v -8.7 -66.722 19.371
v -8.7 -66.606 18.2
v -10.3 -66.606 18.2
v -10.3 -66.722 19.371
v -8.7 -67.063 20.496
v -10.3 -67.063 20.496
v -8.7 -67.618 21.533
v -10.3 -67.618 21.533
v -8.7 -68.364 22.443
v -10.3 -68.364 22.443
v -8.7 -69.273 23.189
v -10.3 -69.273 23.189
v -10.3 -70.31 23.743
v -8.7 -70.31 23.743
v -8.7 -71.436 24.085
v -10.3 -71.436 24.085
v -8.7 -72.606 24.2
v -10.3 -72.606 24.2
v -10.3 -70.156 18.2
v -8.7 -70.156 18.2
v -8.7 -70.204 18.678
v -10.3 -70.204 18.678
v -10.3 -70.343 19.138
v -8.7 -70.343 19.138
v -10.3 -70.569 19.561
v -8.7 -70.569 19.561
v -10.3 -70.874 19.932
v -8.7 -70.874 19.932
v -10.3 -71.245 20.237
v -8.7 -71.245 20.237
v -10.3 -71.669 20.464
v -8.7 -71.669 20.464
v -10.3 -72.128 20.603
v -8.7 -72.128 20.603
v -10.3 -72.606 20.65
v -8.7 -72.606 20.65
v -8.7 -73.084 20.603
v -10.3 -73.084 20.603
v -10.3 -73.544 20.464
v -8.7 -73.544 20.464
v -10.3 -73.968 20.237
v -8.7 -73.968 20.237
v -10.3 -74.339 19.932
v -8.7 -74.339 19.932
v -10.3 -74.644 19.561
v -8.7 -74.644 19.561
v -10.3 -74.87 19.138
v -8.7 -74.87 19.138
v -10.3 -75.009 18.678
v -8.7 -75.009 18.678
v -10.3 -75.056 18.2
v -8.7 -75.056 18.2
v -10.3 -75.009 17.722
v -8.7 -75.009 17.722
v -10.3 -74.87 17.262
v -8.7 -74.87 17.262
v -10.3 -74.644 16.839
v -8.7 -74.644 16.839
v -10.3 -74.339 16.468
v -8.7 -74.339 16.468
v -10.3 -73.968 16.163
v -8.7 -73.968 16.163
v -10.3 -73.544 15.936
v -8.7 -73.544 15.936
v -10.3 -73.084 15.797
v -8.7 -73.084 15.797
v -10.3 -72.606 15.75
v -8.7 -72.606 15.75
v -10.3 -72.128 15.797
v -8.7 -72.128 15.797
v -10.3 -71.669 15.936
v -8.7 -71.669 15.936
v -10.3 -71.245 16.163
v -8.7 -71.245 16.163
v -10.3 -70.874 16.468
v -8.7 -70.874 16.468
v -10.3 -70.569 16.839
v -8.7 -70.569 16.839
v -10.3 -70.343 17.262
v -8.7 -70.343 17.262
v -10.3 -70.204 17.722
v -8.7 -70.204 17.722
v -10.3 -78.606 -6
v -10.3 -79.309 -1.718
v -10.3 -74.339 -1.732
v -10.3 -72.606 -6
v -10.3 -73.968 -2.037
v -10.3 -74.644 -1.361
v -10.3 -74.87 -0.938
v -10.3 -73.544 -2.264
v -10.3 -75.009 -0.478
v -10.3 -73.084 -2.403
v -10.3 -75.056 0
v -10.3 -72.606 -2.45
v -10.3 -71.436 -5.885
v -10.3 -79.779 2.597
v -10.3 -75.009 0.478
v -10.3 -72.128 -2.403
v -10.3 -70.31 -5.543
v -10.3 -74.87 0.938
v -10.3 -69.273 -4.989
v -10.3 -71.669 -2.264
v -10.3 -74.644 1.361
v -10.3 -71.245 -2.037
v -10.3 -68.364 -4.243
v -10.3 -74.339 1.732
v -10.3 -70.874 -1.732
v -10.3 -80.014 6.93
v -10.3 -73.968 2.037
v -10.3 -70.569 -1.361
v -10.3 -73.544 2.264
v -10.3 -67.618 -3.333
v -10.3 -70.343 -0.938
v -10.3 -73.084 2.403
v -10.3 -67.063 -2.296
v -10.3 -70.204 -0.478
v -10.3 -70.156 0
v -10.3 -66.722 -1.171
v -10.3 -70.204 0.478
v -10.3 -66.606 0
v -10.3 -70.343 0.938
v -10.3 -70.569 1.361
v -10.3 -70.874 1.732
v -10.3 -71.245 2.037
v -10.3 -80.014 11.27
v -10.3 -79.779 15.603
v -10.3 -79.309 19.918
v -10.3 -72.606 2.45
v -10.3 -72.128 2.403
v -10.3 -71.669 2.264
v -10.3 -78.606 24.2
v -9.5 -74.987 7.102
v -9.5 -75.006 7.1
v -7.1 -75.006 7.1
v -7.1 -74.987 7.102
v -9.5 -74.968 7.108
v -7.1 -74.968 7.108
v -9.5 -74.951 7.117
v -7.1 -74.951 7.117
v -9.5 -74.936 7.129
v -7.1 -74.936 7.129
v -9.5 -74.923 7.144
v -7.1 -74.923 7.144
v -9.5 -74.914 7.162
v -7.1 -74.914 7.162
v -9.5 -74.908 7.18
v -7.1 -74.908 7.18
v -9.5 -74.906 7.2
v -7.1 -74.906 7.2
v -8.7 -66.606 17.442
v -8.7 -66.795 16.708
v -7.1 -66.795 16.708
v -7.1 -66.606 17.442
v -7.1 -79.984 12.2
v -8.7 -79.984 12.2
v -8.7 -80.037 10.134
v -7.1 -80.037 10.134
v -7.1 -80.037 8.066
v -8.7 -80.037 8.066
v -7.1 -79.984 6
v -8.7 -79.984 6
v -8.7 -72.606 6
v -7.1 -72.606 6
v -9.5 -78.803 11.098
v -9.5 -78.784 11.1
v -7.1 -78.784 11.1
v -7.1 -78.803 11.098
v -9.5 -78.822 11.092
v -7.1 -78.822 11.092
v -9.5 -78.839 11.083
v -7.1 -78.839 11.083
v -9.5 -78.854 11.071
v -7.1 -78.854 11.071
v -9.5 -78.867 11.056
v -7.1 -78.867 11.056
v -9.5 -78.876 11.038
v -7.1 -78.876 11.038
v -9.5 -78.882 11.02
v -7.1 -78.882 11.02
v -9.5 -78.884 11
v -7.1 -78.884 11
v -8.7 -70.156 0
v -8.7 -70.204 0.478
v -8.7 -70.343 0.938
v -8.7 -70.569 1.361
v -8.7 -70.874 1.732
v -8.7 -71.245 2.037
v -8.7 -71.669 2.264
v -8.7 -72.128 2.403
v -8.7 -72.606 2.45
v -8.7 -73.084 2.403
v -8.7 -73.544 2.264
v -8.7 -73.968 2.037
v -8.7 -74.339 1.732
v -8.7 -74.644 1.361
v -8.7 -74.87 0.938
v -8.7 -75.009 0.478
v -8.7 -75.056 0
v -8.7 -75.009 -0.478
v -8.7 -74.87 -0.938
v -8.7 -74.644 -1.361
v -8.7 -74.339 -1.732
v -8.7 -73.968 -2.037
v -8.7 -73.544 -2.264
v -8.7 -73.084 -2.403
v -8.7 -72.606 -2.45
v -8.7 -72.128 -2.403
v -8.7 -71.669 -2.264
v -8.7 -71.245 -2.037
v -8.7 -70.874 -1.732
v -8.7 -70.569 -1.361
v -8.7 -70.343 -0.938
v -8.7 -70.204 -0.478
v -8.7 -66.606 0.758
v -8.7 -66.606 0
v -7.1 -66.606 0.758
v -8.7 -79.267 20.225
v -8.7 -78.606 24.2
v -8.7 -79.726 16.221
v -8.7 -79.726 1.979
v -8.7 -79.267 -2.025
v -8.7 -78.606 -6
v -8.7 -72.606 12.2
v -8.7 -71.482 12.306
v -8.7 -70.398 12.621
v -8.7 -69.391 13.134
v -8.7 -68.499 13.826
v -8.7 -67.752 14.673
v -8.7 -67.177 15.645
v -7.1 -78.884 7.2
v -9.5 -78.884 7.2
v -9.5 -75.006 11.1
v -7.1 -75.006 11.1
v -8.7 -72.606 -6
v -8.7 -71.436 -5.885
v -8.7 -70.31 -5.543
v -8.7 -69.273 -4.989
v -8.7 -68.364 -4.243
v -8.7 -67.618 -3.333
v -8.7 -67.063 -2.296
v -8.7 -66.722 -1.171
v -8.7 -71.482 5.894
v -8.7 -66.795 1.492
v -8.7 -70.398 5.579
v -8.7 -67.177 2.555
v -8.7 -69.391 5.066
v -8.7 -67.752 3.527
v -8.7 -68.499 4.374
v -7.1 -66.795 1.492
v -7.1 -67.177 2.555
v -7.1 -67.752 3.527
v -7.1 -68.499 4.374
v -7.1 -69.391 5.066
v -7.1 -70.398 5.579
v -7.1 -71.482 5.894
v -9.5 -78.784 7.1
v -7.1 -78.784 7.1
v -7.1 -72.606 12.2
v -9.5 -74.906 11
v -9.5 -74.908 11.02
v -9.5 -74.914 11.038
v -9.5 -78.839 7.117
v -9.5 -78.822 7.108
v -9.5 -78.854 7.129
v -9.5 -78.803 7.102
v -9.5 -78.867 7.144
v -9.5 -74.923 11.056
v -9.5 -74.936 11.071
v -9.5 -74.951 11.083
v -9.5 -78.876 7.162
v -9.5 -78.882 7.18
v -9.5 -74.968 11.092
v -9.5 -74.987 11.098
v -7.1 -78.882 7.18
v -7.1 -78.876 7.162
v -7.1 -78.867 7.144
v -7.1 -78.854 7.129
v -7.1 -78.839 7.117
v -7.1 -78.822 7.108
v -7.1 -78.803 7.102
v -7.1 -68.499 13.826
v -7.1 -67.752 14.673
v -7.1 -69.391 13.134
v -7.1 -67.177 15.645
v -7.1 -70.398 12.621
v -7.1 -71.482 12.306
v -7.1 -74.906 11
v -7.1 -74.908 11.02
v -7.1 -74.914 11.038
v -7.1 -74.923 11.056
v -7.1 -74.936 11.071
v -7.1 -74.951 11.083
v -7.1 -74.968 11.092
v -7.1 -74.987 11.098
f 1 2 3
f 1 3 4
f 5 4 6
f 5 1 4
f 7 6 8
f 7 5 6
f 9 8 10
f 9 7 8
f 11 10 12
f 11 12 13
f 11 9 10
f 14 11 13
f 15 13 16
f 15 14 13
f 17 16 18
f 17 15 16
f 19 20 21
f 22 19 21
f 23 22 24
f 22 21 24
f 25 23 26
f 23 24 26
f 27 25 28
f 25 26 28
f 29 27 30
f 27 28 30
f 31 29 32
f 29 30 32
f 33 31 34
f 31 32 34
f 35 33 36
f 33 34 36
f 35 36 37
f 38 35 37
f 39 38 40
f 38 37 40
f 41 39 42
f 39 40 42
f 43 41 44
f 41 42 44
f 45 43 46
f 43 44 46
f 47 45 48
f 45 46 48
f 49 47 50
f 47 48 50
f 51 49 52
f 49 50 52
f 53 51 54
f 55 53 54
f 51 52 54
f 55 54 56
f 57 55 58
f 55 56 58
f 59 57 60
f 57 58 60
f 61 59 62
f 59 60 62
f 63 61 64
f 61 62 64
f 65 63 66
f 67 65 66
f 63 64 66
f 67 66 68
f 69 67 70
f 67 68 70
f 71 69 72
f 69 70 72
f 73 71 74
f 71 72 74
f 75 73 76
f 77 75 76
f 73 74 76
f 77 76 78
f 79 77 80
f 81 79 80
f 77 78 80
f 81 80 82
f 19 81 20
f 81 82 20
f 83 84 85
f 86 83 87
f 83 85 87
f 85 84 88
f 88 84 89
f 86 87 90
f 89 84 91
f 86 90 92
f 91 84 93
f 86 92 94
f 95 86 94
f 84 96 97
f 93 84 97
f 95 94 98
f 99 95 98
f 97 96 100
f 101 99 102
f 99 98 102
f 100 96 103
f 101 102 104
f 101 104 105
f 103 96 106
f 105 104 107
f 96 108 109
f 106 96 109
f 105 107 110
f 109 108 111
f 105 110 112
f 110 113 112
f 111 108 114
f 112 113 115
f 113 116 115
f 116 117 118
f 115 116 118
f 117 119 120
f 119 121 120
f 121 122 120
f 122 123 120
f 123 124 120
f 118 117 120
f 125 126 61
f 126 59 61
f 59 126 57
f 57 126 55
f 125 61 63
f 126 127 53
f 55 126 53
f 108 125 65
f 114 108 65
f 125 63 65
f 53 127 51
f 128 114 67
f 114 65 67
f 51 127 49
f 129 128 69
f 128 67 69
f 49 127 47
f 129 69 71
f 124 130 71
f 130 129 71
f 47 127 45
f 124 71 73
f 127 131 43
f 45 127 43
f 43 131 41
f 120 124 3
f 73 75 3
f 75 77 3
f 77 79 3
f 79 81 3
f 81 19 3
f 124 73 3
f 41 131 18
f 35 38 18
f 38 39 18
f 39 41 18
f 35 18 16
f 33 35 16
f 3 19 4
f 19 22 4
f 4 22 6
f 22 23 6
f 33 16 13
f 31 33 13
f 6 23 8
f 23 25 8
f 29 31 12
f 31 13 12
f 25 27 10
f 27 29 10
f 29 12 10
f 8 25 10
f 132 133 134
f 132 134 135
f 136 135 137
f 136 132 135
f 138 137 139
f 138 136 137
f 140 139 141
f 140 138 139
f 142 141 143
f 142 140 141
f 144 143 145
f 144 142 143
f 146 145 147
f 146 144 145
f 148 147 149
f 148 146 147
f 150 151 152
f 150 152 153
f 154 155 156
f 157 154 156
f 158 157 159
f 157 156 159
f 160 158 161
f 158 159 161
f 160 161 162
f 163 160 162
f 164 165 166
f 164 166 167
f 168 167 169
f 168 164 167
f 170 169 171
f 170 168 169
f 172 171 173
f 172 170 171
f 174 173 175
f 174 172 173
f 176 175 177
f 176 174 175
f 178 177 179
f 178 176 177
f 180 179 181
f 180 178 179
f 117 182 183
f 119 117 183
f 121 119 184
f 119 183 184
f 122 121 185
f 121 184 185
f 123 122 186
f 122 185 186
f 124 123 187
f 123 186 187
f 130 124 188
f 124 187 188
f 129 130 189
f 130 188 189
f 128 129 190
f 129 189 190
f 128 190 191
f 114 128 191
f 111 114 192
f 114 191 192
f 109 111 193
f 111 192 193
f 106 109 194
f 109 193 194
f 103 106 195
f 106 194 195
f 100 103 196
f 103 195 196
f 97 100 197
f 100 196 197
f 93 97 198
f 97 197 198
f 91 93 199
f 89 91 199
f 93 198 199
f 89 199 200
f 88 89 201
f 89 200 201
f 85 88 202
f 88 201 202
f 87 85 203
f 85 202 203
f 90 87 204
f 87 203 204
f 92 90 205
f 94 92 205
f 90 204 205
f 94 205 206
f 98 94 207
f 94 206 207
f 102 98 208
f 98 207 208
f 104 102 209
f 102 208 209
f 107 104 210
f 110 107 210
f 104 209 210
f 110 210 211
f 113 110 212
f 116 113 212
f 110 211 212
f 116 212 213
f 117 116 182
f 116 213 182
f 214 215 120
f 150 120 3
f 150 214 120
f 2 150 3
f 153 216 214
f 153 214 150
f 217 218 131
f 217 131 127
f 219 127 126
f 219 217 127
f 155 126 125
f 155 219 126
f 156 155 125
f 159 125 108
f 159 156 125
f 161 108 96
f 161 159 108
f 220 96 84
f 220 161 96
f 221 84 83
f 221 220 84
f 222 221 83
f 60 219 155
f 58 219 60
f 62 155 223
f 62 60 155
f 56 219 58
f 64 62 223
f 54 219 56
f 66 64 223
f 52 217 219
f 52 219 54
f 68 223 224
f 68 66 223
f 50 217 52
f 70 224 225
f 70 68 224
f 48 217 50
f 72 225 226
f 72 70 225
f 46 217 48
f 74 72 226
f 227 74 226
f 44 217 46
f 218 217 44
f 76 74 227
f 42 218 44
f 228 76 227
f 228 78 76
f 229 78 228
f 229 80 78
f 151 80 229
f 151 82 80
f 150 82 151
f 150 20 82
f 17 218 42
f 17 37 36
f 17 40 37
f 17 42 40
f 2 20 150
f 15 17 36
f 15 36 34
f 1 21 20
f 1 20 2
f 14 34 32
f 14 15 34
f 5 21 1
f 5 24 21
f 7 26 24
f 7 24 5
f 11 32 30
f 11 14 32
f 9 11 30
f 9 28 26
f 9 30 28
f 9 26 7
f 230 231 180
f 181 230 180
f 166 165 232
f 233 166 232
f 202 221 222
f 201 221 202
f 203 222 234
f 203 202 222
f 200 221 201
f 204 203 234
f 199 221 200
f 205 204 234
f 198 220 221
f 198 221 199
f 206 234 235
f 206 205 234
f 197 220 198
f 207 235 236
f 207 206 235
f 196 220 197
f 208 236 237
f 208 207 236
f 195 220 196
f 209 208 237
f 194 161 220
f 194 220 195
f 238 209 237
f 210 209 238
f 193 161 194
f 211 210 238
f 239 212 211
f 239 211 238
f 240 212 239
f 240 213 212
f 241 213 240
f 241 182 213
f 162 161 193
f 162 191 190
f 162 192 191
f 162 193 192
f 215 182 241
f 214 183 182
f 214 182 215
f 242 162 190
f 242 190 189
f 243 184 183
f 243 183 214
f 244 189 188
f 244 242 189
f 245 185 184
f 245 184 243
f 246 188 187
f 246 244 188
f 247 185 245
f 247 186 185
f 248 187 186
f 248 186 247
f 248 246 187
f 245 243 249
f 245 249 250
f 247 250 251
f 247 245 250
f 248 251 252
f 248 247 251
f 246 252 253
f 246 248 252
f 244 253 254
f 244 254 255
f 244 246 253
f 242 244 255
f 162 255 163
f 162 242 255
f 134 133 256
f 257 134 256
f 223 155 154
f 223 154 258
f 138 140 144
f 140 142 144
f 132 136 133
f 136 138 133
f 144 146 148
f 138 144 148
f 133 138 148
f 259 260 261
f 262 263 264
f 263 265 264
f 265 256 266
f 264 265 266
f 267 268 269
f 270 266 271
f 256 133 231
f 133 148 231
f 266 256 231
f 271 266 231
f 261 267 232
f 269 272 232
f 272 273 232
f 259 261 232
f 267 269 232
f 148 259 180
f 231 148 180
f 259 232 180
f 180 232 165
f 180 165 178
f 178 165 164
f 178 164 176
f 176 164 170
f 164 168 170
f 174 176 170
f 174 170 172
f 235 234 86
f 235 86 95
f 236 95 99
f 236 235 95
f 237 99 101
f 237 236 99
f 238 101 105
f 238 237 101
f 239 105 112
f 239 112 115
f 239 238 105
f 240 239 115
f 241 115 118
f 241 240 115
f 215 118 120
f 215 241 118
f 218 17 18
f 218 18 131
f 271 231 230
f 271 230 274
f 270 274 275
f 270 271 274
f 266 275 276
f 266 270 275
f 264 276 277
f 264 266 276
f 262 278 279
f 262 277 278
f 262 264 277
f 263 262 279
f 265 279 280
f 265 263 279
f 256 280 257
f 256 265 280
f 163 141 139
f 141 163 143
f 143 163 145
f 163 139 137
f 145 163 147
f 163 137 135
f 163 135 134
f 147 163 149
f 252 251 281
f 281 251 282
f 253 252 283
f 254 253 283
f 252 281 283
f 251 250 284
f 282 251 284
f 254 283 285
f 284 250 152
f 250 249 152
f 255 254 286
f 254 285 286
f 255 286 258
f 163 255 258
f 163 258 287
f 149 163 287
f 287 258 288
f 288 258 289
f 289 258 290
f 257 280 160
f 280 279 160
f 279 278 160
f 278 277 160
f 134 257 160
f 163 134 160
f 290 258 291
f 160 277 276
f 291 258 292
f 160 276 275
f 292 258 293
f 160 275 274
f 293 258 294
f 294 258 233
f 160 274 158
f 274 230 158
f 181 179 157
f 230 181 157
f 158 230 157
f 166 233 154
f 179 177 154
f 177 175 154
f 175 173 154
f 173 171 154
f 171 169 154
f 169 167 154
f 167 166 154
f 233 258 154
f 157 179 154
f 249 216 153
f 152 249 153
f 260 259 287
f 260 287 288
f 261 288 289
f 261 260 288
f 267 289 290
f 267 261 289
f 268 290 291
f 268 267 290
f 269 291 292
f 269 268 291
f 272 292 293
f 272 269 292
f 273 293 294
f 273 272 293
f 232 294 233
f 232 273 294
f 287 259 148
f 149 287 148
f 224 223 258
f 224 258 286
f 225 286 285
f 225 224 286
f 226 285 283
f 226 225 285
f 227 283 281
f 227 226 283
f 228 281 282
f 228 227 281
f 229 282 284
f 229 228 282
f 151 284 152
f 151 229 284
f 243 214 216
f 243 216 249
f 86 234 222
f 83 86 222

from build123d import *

# Parameters (mm, degrees)
SKETCH004_R  = 2.45
PAD003_DEPTH = 1.6
PAD004_DEPTH = 1.6
POCKET_DEPTH = 2.401


with BuildPart() as part:
    # Sketch004 → Pad003 (new body)
    with BuildSketch(Plane.YZ.offset(-8.7)):
        with BuildLine():
            ThreePointArc((6, 18.2), (4.2426406871, 22.4426406871), (0, 24.2))
            Line((0, 24.2), (-6, 24.2))
            ThreePointArc((-6, 24.2), (-7.4371881489, 9.1), (-6, -6))
            Line((0, -6), (-6, -6))
            ThreePointArc((0, -6), (4.2426406871, -4.2426406871), (6, 0))
            Line((6, 0), (6, 18.2))
        make_face()
        with Locations((0, 18.2)):
            Circle(SKETCH004_R, mode=Mode.SUBTRACT)
        Circle(SKETCH004_R, mode=Mode.SUBTRACT)
    extrude(amount=-PAD003_DEPTH)

    # Sketch005 → Pad004 (join)
    with BuildSketch(Plane.YZ.offset(-8.7)):
        with BuildLine():
            ThreePointArc((0, 12.2), (3.6774423219, 13.4590699257), (5.8114989668, 16.707860677))
            Line((5.8114989668, 16.707860677), (6, 17.4420237293))
            Line((6, 17.4420237293), (6, 0.7579762707))
            Line((6, 0.7579762707), (5.8114989668, 1.492139323))
            ThreePointArc((5.8114989668, 1.492139323), (3.6774423219, 4.7409300743), (0, 6))
            Line((-7.3771358599, 6), (0, 6))
            ThreePointArc((-7.3771358599, 12.2), (-7.4371881489, 9.1), (-7.3771358599, 6))
            Line((-7.3771358599, 12.2), (0, 12.2))
        make_face()
    extrude(amount=PAD004_DEPTH)

    # Sketch065 (on Face1 of Binder015) → Pocket (cut, through all)
    with BuildSketch(Plane(origin=(-9.5, 0, 0), x_dir=(0, -1, 0), z_dir=(-1, 0, 0))):
        with BuildLine():
            Line((6.1771358599, 11.1), (2.4, 11.1))
            ThreePointArc((2.3, 11), (2.3292893219, 11.0707106781), (2.4, 11.1))
            Line((2.3, 11), (2.3, 7.2))
            ThreePointArc((2.4, 7.1), (2.3292893219, 7.1292893219), (2.3, 7.2))
            Line((2.4, 7.1), (6.1771358599, 7.1))
            ThreePointArc((6.2771358599, 7.2), (6.247846538, 7.1292893219), (6.1771358599, 7.1))
            Line((6.2771358599, 7.2), (6.2771358599, 11))
            ThreePointArc((6.1771358599, 11.1), (6.247846538, 11.0707106781), (6.2771358599, 11))
        make_face()
    extrude(amount=-POCKET_DEPTH, mode=Mode.SUBTRACT)


with BuildPart() as part_1:
    # Body005 placement: moved
    add(part.part.moved(Location((0, -72.6064407756, 0))))


solid = part_1.part
